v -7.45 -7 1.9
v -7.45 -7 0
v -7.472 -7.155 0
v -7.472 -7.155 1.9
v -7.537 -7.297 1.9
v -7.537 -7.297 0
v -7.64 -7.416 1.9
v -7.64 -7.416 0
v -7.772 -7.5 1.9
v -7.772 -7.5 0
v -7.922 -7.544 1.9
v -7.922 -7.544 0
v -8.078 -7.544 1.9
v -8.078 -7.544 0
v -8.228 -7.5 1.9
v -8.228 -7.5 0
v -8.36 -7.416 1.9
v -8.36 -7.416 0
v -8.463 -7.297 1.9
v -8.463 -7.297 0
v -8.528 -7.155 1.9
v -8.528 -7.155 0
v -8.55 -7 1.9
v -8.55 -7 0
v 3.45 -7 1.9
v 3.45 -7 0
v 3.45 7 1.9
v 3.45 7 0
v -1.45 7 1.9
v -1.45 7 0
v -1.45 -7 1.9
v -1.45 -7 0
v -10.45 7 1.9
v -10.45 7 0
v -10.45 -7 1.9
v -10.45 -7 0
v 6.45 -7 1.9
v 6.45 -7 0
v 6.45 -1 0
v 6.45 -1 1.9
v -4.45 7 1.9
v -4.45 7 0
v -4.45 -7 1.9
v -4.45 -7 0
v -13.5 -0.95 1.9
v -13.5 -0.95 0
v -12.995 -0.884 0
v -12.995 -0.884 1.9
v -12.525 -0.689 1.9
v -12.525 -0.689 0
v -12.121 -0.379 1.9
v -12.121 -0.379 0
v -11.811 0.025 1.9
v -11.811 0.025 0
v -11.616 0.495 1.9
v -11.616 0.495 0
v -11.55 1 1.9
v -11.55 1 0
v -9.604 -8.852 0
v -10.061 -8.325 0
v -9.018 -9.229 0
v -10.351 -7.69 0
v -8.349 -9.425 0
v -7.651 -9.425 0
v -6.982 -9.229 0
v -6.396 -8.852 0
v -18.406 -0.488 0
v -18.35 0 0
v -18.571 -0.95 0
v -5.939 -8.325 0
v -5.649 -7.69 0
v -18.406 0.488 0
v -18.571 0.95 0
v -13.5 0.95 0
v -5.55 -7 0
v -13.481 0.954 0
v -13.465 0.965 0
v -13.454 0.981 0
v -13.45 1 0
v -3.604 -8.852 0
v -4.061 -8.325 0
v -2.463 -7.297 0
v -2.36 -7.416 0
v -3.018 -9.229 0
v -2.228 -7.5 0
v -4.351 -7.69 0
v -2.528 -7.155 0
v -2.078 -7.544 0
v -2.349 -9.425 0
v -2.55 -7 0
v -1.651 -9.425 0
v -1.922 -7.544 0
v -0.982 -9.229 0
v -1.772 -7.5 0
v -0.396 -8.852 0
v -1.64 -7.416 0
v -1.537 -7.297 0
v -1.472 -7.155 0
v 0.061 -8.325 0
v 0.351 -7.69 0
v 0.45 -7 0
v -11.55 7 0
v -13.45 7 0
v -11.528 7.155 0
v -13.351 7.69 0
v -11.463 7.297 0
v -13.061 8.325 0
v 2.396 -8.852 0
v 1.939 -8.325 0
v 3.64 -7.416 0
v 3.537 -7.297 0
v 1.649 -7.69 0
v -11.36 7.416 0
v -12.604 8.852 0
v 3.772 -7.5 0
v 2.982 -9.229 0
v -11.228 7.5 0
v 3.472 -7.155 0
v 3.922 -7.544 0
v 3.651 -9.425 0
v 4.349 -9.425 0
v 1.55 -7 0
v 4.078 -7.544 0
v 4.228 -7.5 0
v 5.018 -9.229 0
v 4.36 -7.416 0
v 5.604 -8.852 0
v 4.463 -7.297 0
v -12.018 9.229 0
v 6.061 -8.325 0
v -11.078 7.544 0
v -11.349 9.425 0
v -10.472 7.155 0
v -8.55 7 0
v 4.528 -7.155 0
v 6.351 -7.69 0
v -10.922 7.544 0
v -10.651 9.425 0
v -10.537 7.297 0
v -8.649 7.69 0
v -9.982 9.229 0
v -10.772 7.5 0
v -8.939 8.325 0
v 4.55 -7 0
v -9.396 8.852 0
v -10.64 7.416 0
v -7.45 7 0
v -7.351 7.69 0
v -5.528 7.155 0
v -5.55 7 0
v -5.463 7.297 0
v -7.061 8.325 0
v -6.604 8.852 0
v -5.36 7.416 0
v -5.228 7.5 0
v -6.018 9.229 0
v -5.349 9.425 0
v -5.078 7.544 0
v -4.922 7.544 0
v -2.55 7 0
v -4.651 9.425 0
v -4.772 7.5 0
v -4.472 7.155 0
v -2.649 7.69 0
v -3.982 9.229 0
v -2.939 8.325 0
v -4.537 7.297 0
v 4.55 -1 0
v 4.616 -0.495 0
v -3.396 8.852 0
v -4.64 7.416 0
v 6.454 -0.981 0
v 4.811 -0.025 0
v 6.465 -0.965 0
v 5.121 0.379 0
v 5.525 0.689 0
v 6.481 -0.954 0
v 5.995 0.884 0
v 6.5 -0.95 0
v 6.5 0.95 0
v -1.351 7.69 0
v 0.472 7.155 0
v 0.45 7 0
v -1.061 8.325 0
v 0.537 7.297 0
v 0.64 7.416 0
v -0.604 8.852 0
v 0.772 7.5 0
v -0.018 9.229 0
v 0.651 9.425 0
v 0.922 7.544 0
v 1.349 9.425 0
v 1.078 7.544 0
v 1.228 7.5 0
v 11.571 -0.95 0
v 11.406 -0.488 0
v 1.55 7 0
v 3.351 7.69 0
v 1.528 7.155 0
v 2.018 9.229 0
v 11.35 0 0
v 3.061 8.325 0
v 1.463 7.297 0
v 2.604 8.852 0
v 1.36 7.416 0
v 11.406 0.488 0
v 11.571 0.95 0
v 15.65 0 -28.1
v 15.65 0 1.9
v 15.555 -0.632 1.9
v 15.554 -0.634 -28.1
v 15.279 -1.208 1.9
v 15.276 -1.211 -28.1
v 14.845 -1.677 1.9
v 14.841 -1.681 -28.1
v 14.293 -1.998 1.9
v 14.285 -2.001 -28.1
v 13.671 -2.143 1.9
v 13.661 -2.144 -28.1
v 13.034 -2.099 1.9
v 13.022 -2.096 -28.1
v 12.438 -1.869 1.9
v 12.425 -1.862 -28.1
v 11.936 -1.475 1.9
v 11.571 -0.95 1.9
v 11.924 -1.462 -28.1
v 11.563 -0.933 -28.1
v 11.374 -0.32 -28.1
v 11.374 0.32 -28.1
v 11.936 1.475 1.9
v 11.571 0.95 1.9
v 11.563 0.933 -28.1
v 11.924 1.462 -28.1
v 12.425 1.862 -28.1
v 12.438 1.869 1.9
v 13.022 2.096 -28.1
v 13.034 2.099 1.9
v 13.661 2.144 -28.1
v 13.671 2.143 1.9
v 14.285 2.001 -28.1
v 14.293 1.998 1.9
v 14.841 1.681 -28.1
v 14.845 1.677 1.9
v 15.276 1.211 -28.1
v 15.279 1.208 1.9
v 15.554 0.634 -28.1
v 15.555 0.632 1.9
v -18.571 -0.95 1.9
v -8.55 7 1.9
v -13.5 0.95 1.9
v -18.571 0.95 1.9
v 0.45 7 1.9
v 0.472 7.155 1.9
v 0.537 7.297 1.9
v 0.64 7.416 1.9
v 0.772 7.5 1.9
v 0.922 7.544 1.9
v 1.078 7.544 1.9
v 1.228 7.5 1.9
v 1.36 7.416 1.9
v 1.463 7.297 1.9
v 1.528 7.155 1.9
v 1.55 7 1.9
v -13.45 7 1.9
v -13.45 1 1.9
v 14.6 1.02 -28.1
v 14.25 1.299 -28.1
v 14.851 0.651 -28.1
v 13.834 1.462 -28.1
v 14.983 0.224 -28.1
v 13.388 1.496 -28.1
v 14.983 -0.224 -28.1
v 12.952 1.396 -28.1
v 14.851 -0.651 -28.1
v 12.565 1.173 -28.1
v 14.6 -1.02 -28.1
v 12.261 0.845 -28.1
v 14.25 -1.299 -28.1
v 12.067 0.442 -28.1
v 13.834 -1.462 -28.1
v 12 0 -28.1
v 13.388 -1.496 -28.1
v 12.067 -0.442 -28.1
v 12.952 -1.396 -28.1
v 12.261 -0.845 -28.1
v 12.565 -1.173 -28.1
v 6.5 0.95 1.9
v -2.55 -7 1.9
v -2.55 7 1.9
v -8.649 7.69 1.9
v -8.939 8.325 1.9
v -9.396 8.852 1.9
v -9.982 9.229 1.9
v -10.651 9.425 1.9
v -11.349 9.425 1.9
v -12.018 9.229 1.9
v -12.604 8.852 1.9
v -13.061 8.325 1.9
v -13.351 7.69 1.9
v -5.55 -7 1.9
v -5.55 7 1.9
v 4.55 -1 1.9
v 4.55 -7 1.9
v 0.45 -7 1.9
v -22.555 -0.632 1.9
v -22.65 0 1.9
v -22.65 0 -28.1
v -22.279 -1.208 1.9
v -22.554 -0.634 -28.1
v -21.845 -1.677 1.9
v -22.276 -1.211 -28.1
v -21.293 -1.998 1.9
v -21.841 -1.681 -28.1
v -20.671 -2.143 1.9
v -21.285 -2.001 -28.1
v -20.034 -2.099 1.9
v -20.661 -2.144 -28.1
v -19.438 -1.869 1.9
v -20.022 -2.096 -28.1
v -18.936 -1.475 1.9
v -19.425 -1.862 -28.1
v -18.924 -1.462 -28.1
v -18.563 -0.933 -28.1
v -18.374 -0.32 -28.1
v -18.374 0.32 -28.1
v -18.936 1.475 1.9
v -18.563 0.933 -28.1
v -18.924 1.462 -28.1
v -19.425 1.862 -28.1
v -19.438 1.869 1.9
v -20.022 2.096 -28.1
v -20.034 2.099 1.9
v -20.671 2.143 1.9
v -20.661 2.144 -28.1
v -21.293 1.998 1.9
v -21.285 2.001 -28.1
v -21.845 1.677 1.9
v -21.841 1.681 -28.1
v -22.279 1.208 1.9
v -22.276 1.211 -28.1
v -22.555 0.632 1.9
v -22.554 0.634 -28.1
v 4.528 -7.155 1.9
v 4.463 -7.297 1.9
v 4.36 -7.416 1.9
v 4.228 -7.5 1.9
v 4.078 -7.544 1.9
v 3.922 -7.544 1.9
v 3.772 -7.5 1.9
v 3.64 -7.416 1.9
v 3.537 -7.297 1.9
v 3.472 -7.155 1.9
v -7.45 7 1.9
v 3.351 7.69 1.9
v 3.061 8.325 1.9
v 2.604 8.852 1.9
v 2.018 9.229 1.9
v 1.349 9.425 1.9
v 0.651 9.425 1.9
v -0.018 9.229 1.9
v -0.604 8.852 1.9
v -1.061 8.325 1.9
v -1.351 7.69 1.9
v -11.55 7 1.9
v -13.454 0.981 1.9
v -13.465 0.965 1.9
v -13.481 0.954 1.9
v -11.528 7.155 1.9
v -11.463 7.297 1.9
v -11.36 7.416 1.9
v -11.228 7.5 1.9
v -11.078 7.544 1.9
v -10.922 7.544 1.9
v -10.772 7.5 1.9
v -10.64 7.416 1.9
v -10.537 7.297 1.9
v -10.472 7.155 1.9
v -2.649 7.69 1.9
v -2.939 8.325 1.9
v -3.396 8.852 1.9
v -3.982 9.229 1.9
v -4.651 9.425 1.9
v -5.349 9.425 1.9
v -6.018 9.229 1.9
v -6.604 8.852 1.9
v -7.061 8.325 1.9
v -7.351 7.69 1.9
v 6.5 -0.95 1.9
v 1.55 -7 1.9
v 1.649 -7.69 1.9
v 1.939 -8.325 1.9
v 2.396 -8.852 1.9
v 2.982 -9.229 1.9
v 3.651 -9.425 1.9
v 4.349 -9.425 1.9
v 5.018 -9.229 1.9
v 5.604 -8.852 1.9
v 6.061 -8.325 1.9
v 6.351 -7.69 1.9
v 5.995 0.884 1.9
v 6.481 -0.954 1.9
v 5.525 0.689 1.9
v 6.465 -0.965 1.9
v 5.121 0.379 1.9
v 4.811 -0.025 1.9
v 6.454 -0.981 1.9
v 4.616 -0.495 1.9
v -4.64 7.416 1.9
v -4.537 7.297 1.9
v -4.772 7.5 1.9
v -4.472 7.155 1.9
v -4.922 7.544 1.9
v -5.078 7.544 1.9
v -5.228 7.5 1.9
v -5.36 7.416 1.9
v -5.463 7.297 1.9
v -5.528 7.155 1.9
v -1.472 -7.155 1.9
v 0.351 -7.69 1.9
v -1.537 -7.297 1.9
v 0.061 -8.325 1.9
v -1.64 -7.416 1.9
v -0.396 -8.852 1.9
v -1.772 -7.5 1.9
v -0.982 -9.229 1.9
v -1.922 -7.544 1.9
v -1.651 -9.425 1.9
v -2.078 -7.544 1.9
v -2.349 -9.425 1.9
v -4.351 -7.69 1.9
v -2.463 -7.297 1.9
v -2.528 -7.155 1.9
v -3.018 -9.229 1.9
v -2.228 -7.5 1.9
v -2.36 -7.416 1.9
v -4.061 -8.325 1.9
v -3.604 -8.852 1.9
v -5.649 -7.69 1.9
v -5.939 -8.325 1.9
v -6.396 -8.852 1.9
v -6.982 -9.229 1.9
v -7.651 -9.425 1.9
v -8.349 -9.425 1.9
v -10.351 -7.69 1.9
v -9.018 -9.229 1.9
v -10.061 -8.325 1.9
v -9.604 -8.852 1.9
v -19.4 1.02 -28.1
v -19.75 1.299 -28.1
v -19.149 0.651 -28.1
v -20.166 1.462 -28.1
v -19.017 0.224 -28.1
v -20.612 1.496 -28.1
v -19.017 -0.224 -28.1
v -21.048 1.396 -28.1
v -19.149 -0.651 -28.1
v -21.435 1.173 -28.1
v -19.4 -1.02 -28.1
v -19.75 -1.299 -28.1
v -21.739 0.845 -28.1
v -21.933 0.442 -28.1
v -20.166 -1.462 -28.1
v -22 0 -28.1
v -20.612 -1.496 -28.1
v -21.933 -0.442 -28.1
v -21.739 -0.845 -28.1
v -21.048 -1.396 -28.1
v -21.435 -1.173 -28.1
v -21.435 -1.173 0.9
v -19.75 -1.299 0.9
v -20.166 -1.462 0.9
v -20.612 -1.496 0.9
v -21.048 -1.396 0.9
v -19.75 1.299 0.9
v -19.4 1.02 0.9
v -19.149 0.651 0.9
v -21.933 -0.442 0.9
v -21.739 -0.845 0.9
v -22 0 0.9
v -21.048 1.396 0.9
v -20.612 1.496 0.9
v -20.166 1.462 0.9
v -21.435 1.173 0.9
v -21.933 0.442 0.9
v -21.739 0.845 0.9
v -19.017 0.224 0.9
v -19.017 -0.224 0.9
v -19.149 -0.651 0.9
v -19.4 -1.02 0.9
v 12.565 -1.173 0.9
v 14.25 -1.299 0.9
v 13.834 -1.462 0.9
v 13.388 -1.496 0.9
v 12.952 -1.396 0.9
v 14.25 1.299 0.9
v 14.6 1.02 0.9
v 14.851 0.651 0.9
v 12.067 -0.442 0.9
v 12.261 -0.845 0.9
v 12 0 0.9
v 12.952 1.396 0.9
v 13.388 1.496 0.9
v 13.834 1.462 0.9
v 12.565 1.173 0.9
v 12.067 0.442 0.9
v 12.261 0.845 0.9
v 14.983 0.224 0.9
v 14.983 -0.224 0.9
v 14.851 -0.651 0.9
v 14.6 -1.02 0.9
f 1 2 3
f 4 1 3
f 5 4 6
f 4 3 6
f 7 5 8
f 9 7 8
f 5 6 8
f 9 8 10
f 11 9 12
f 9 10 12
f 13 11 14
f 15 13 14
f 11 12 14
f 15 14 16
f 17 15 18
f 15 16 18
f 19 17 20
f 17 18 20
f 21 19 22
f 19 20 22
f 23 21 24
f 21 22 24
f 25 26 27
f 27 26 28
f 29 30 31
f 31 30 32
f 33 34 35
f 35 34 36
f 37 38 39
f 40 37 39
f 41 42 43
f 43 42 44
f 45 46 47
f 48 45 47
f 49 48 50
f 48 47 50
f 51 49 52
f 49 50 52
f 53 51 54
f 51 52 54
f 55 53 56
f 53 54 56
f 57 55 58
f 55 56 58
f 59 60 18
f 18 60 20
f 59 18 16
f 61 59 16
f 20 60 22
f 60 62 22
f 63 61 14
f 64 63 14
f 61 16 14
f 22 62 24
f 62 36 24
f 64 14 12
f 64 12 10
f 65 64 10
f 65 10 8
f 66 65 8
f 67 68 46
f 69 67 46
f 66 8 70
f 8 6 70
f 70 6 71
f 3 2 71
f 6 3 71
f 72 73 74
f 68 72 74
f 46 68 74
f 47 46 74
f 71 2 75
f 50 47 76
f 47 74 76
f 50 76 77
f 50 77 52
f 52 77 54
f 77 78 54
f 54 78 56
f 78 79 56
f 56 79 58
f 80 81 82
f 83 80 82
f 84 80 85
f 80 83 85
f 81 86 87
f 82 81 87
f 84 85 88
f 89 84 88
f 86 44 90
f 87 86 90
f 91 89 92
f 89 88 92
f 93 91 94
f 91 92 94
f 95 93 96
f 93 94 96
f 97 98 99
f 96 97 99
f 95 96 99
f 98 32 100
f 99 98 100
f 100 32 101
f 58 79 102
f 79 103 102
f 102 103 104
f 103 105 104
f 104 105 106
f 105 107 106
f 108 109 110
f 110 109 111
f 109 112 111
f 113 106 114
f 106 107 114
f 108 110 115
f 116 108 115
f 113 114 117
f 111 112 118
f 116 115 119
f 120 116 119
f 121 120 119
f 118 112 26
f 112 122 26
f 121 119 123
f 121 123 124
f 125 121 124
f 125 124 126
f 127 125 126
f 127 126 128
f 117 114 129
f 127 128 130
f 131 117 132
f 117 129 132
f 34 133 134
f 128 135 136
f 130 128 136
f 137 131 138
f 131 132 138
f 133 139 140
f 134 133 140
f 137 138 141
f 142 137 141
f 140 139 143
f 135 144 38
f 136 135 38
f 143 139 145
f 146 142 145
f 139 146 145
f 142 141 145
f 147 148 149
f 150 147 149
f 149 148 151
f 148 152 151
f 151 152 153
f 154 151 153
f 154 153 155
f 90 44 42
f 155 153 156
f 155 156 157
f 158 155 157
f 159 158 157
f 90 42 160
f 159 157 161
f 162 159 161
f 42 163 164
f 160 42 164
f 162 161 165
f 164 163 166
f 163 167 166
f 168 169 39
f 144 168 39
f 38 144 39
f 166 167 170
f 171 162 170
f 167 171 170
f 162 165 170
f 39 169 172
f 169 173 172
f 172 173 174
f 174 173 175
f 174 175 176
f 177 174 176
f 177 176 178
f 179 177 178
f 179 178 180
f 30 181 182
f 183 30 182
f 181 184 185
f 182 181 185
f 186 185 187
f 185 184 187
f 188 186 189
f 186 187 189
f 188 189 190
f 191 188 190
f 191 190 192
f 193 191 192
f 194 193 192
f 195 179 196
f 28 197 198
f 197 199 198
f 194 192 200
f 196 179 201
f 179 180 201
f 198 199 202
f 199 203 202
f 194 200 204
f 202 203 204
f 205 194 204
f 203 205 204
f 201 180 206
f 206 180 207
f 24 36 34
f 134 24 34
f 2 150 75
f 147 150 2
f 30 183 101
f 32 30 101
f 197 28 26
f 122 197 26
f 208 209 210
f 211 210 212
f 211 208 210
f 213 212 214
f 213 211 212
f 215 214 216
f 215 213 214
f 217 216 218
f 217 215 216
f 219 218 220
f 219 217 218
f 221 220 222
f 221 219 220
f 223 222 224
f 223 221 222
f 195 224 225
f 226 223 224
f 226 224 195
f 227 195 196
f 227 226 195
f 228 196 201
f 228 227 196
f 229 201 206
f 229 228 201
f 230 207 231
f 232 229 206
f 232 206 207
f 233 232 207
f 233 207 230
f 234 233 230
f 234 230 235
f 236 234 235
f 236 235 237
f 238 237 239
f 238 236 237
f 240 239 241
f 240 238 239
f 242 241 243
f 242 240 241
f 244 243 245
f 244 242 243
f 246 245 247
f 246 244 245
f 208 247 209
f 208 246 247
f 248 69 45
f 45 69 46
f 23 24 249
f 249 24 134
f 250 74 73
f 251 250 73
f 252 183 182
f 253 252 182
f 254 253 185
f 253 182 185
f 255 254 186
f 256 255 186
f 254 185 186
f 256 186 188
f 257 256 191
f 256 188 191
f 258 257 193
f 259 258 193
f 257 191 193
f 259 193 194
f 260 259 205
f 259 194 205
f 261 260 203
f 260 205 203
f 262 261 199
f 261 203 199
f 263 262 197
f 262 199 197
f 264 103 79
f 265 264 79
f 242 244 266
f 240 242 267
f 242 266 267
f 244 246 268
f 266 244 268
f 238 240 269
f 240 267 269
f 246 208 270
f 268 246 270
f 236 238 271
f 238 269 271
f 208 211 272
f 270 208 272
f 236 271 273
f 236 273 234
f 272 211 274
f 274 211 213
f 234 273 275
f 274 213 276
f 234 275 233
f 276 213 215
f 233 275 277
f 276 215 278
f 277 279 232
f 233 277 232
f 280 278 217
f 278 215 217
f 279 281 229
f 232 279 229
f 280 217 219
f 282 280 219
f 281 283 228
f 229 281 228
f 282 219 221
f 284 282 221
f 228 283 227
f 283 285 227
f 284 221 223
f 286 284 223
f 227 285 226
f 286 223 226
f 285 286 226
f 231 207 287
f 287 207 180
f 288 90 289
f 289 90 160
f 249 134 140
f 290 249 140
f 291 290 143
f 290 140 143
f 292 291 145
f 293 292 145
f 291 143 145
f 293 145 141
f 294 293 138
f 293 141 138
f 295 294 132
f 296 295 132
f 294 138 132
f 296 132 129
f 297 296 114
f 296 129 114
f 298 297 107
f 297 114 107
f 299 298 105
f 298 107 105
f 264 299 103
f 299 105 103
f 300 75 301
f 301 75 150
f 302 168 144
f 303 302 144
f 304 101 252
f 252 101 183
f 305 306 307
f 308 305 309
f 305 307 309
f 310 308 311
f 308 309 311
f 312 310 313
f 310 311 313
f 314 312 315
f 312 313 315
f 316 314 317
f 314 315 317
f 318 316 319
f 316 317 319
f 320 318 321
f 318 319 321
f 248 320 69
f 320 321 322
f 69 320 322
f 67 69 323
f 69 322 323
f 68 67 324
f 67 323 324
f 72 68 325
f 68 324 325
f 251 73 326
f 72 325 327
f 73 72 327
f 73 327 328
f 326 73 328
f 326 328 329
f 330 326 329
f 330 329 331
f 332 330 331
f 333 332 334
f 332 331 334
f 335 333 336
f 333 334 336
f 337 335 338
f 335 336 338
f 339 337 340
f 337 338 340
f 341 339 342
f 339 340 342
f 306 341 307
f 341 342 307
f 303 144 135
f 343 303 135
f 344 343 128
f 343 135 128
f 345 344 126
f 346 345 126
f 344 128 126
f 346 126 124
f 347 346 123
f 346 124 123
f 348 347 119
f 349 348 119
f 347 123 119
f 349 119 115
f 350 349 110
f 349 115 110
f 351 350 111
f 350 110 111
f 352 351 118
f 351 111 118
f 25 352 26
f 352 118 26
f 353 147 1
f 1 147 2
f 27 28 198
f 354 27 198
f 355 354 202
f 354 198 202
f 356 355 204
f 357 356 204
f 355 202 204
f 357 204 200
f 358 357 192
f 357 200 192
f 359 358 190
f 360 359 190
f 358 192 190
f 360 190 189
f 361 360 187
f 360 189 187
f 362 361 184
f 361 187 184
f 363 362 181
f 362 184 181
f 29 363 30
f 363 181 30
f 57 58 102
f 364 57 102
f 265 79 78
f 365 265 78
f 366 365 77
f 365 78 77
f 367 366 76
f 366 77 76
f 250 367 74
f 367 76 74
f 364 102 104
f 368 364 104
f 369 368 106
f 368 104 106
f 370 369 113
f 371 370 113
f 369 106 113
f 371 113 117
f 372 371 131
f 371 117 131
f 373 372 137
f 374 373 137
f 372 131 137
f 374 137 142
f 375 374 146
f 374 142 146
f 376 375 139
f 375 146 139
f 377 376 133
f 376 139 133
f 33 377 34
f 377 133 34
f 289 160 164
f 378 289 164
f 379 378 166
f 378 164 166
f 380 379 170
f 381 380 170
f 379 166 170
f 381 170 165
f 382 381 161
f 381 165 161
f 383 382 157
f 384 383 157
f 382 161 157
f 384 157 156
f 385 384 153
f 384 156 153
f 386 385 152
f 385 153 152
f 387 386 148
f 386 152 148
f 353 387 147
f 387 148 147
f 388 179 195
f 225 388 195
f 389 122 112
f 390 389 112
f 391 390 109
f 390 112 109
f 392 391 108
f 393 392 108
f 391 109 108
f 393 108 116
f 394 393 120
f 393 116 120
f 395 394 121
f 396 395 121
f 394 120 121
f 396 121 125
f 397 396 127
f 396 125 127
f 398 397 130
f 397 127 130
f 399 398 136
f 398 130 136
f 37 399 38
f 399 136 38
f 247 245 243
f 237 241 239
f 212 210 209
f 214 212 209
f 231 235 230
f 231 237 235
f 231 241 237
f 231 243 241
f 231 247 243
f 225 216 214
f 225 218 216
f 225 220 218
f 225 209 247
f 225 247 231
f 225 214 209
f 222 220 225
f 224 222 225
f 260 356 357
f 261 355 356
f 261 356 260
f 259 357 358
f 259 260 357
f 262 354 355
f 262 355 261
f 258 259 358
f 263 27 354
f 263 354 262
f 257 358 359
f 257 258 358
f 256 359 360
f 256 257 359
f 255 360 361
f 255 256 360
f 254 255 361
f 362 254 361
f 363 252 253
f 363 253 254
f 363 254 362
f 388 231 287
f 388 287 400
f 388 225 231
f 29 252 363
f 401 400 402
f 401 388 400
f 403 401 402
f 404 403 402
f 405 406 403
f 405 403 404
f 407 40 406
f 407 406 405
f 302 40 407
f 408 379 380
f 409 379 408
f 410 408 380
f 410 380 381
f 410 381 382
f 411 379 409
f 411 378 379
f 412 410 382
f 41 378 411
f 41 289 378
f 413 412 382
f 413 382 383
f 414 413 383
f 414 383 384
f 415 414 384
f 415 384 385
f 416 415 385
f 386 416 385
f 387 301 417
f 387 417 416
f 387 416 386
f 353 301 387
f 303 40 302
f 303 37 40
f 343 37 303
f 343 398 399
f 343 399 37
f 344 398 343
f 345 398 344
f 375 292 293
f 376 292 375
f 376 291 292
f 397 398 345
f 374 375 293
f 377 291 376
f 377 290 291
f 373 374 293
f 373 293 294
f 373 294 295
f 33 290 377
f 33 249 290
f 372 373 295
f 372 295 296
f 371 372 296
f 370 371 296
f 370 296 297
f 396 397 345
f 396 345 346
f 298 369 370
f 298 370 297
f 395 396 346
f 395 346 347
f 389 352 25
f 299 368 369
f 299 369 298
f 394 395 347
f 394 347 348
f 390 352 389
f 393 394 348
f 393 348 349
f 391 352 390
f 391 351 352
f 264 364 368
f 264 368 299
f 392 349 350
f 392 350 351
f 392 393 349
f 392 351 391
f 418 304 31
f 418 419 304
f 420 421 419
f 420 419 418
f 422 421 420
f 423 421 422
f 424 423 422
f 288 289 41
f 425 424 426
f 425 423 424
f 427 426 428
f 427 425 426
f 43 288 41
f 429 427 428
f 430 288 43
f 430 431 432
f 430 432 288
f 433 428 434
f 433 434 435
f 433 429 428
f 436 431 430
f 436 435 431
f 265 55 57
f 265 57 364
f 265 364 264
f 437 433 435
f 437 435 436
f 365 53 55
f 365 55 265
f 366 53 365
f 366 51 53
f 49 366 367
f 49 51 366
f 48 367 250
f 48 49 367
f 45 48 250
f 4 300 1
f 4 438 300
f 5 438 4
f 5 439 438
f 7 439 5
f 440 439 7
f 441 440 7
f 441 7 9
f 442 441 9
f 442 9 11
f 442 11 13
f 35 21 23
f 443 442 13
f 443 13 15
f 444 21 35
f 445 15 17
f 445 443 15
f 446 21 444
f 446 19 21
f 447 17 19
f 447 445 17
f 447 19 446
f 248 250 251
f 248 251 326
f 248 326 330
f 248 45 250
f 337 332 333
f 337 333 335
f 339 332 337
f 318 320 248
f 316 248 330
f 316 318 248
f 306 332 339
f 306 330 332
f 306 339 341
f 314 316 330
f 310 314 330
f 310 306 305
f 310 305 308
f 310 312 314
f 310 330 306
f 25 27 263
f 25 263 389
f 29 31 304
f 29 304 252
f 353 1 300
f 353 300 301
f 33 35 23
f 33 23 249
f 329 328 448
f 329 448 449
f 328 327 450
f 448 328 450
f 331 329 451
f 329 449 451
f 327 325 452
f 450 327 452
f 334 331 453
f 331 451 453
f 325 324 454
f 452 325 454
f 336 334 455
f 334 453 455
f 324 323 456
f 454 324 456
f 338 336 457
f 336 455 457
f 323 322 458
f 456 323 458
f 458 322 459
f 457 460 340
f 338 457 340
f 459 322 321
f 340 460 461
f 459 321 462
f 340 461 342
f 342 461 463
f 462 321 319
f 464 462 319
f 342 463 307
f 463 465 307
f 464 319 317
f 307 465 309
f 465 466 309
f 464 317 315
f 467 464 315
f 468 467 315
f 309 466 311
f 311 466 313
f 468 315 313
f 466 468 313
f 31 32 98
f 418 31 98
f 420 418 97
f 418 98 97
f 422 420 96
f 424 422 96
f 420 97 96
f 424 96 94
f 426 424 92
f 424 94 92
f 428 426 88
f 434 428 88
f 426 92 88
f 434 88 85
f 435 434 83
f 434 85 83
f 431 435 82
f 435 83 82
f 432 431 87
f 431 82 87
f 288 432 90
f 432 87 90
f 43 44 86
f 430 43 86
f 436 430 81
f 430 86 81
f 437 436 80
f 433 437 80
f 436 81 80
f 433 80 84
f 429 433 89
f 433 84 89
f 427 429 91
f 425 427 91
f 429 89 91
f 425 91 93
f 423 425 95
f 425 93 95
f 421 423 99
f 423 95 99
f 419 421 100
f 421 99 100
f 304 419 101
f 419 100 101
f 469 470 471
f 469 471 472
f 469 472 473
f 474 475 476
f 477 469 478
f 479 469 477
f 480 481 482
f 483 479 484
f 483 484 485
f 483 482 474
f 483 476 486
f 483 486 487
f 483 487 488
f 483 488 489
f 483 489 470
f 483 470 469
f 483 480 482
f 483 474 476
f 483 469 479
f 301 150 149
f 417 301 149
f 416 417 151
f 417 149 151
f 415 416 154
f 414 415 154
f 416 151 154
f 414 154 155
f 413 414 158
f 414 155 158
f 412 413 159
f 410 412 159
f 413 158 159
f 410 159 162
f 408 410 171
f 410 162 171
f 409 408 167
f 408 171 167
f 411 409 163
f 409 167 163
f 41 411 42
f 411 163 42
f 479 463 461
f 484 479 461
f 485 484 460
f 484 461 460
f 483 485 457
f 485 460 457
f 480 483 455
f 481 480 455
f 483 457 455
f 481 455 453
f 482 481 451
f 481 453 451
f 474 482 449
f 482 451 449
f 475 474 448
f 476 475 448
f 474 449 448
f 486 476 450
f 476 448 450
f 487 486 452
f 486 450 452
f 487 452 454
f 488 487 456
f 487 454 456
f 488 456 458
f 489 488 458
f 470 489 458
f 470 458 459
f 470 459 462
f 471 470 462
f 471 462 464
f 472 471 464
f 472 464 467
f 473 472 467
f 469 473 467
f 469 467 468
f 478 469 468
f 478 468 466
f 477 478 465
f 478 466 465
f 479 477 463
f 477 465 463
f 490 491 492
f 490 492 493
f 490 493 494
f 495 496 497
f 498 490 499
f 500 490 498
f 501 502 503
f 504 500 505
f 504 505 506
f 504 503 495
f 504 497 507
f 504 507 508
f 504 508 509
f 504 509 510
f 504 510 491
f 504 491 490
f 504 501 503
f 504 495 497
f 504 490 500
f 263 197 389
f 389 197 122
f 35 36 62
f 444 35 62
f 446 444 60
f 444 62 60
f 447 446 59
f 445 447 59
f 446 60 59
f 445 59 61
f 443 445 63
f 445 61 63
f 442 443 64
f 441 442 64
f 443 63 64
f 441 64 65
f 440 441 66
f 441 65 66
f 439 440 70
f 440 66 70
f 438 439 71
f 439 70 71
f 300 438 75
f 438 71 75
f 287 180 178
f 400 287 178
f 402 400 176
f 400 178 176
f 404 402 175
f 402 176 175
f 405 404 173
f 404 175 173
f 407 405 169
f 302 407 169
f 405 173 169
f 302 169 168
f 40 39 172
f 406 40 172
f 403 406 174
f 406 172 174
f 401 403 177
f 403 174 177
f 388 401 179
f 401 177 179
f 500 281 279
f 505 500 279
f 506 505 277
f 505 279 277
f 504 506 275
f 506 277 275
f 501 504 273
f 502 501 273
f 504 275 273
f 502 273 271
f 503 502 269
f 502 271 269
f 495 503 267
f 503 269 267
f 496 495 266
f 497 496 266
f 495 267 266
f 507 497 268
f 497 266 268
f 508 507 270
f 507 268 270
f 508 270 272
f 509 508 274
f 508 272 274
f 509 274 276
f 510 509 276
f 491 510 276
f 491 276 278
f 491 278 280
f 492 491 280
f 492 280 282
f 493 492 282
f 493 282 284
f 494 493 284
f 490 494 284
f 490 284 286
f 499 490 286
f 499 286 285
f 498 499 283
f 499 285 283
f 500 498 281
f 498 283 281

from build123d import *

# Parameters (mm, degrees)
BOSS_EXTRUDE1_DEPTH = 1.9
SKETCH5_W           = 2.15
SKETCH5_H           = 30
SKETCH4_W           = 2.15
SKETCH4_H           = 30
SKETCH6_R           = 1.5
CUT_EXTRUDE1_DEPTH  = 29


with BuildPart() as part:
    # Sketch2 → Boss-Extrude1 (new body)
    with BuildSketch(Plane.XY):
        with BuildLine():
            Line((-20.5, -0.95), (-13.5, -0.95))
            ThreePointArc((-13.5, -0.95), (-12.121141777, -0.378858223), (-11.55, 1))
            Line((-11.55, 1), (-11.55, 7))
            ThreePointArc((-11.55, 7), (-11, 7.55), (-10.45, 7))
            Line((-10.45, 7), (-10.45, 0))
            Line((-10.45, 0), (-10.45, -7))
            ThreePointArc((-10.45, -7), (-8, -9.45), (-5.55, -7))
            Line((-5.55, -7), (-5.55, 0))
            Line((-5.55, 0), (-5.55, 7))
            ThreePointArc((-5.55, 7), (-5, 7.55), (-4.45, 7))
            Line((-4.45, 7), (-4.45, 0))
            Line((-4.45, 0), (-4.45, -7))
            ThreePointArc((-4.45, -7), (-2, -9.45), (0.45, -7))
            Line((0.45, -7), (0.45, 0))
            Line((0.45, 0), (0.45, 7))
            ThreePointArc((0.45, 7), (1, 7.55), (1.55, 7))
            Line((1.55, 7), (1.55, 0))
            Line((1.55, 0), (1.55, -7))
            ThreePointArc((1.55, -7), (4, -9.45), (6.45, -7))
            Line((6.45, -7), (6.45, -1))
            ThreePointArc((6.45, -1), (6.464644661, -0.964644661), (6.5, -0.95))
            Line((6.5, -0.95), (13.5, -0.95))
            ThreePointArc((13.5, -0.95), (14.45, 0), (13.5, 0.95))
            Line((13.5, 0.95), (6.5, 0.95))
            ThreePointArc((6.5, 0.95), (5.121141777, 0.378858223), (4.55, -1))
            Line((4.55, -1), (4.55, -7))
            ThreePointArc((4.55, -7), (4, -7.55), (3.45, -7))
            Line((3.45, -7), (3.45, 0))
            Line((3.45, 0), (3.45, 7))
            ThreePointArc((3.45, 7), (1, 9.45), (-1.45, 7))
            Line((-1.45, 7), (-1.45, 0))
            Line((-1.45, 0), (-1.45, -7))
            ThreePointArc((-1.45, -7), (-2, -7.55), (-2.55, -7))
            Line((-2.55, -7), (-2.55, 0))
            Line((-2.55, 0), (-2.55, 7))
            ThreePointArc((-2.55, 7), (-5, 9.45), (-7.45, 7))
            Line((-7.45, 7), (-7.45, 0))
            Line((-7.45, 0), (-7.45, -7))
            ThreePointArc((-7.45, -7), (-8, -7.55), (-8.55, -7))
            Line((-8.55, -7), (-8.55, 0))
            Line((-8.55, 0), (-8.55, 7))
            ThreePointArc((-8.55, 7), (-11, 9.45), (-13.45, 7))
            Line((-13.45, 7), (-13.45, 1))
            ThreePointArc((-13.45, 1), (-13.464644661, 0.964644661), (-13.5, 0.95))
            Line((-13.5, 0.95), (-20.5, 0.95))
            ThreePointArc((-20.5, 0.95), (-21.45, 0), (-20.5, -0.95))
        make_face()
    extrude(amount=BOSS_EXTRUDE1_DEPTH)

    # Sketch5 → Revolve1 (revolve)
    with BuildSketch(Plane(origin=(0, 0, 0), x_dir=(1, 0, 0), z_dir=(0, 1, 0))):
        with Locations((-21.575, 13.1)):
            Rectangle(SKETCH5_W, SKETCH5_H)
    revolve(axis=Axis((-20.5, 0, -28.1), (0, 0, 1)))

    # Sketch4 → Revolve2 (revolve)
    with BuildSketch(Plane(origin=(0, 0, 0), x_dir=(1, 0, 0), z_dir=(0, 1, 0))):
        with Locations((14.575, 13.1)):
            Rectangle(SKETCH4_W, SKETCH4_H)
    revolve(axis=Axis((13.5, 0, 1.9), (0, 0, -1)))

    # Sketch6 → Cut-Extrude1 (cut)
    with BuildSketch(Plane(origin=(0, 0, -28.1), x_dir=(-1, 0, 0), z_dir=(0, 0, -1))):
        with Locations((-13.5, 0)):
            Circle(SKETCH6_R)
        with Locations((20.5, 0)):
            Circle(SKETCH6_R)
    extrude(amount=-CUT_EXTRUDE1_DEPTH, mode=Mode.SUBTRACT)


solid = part.part
